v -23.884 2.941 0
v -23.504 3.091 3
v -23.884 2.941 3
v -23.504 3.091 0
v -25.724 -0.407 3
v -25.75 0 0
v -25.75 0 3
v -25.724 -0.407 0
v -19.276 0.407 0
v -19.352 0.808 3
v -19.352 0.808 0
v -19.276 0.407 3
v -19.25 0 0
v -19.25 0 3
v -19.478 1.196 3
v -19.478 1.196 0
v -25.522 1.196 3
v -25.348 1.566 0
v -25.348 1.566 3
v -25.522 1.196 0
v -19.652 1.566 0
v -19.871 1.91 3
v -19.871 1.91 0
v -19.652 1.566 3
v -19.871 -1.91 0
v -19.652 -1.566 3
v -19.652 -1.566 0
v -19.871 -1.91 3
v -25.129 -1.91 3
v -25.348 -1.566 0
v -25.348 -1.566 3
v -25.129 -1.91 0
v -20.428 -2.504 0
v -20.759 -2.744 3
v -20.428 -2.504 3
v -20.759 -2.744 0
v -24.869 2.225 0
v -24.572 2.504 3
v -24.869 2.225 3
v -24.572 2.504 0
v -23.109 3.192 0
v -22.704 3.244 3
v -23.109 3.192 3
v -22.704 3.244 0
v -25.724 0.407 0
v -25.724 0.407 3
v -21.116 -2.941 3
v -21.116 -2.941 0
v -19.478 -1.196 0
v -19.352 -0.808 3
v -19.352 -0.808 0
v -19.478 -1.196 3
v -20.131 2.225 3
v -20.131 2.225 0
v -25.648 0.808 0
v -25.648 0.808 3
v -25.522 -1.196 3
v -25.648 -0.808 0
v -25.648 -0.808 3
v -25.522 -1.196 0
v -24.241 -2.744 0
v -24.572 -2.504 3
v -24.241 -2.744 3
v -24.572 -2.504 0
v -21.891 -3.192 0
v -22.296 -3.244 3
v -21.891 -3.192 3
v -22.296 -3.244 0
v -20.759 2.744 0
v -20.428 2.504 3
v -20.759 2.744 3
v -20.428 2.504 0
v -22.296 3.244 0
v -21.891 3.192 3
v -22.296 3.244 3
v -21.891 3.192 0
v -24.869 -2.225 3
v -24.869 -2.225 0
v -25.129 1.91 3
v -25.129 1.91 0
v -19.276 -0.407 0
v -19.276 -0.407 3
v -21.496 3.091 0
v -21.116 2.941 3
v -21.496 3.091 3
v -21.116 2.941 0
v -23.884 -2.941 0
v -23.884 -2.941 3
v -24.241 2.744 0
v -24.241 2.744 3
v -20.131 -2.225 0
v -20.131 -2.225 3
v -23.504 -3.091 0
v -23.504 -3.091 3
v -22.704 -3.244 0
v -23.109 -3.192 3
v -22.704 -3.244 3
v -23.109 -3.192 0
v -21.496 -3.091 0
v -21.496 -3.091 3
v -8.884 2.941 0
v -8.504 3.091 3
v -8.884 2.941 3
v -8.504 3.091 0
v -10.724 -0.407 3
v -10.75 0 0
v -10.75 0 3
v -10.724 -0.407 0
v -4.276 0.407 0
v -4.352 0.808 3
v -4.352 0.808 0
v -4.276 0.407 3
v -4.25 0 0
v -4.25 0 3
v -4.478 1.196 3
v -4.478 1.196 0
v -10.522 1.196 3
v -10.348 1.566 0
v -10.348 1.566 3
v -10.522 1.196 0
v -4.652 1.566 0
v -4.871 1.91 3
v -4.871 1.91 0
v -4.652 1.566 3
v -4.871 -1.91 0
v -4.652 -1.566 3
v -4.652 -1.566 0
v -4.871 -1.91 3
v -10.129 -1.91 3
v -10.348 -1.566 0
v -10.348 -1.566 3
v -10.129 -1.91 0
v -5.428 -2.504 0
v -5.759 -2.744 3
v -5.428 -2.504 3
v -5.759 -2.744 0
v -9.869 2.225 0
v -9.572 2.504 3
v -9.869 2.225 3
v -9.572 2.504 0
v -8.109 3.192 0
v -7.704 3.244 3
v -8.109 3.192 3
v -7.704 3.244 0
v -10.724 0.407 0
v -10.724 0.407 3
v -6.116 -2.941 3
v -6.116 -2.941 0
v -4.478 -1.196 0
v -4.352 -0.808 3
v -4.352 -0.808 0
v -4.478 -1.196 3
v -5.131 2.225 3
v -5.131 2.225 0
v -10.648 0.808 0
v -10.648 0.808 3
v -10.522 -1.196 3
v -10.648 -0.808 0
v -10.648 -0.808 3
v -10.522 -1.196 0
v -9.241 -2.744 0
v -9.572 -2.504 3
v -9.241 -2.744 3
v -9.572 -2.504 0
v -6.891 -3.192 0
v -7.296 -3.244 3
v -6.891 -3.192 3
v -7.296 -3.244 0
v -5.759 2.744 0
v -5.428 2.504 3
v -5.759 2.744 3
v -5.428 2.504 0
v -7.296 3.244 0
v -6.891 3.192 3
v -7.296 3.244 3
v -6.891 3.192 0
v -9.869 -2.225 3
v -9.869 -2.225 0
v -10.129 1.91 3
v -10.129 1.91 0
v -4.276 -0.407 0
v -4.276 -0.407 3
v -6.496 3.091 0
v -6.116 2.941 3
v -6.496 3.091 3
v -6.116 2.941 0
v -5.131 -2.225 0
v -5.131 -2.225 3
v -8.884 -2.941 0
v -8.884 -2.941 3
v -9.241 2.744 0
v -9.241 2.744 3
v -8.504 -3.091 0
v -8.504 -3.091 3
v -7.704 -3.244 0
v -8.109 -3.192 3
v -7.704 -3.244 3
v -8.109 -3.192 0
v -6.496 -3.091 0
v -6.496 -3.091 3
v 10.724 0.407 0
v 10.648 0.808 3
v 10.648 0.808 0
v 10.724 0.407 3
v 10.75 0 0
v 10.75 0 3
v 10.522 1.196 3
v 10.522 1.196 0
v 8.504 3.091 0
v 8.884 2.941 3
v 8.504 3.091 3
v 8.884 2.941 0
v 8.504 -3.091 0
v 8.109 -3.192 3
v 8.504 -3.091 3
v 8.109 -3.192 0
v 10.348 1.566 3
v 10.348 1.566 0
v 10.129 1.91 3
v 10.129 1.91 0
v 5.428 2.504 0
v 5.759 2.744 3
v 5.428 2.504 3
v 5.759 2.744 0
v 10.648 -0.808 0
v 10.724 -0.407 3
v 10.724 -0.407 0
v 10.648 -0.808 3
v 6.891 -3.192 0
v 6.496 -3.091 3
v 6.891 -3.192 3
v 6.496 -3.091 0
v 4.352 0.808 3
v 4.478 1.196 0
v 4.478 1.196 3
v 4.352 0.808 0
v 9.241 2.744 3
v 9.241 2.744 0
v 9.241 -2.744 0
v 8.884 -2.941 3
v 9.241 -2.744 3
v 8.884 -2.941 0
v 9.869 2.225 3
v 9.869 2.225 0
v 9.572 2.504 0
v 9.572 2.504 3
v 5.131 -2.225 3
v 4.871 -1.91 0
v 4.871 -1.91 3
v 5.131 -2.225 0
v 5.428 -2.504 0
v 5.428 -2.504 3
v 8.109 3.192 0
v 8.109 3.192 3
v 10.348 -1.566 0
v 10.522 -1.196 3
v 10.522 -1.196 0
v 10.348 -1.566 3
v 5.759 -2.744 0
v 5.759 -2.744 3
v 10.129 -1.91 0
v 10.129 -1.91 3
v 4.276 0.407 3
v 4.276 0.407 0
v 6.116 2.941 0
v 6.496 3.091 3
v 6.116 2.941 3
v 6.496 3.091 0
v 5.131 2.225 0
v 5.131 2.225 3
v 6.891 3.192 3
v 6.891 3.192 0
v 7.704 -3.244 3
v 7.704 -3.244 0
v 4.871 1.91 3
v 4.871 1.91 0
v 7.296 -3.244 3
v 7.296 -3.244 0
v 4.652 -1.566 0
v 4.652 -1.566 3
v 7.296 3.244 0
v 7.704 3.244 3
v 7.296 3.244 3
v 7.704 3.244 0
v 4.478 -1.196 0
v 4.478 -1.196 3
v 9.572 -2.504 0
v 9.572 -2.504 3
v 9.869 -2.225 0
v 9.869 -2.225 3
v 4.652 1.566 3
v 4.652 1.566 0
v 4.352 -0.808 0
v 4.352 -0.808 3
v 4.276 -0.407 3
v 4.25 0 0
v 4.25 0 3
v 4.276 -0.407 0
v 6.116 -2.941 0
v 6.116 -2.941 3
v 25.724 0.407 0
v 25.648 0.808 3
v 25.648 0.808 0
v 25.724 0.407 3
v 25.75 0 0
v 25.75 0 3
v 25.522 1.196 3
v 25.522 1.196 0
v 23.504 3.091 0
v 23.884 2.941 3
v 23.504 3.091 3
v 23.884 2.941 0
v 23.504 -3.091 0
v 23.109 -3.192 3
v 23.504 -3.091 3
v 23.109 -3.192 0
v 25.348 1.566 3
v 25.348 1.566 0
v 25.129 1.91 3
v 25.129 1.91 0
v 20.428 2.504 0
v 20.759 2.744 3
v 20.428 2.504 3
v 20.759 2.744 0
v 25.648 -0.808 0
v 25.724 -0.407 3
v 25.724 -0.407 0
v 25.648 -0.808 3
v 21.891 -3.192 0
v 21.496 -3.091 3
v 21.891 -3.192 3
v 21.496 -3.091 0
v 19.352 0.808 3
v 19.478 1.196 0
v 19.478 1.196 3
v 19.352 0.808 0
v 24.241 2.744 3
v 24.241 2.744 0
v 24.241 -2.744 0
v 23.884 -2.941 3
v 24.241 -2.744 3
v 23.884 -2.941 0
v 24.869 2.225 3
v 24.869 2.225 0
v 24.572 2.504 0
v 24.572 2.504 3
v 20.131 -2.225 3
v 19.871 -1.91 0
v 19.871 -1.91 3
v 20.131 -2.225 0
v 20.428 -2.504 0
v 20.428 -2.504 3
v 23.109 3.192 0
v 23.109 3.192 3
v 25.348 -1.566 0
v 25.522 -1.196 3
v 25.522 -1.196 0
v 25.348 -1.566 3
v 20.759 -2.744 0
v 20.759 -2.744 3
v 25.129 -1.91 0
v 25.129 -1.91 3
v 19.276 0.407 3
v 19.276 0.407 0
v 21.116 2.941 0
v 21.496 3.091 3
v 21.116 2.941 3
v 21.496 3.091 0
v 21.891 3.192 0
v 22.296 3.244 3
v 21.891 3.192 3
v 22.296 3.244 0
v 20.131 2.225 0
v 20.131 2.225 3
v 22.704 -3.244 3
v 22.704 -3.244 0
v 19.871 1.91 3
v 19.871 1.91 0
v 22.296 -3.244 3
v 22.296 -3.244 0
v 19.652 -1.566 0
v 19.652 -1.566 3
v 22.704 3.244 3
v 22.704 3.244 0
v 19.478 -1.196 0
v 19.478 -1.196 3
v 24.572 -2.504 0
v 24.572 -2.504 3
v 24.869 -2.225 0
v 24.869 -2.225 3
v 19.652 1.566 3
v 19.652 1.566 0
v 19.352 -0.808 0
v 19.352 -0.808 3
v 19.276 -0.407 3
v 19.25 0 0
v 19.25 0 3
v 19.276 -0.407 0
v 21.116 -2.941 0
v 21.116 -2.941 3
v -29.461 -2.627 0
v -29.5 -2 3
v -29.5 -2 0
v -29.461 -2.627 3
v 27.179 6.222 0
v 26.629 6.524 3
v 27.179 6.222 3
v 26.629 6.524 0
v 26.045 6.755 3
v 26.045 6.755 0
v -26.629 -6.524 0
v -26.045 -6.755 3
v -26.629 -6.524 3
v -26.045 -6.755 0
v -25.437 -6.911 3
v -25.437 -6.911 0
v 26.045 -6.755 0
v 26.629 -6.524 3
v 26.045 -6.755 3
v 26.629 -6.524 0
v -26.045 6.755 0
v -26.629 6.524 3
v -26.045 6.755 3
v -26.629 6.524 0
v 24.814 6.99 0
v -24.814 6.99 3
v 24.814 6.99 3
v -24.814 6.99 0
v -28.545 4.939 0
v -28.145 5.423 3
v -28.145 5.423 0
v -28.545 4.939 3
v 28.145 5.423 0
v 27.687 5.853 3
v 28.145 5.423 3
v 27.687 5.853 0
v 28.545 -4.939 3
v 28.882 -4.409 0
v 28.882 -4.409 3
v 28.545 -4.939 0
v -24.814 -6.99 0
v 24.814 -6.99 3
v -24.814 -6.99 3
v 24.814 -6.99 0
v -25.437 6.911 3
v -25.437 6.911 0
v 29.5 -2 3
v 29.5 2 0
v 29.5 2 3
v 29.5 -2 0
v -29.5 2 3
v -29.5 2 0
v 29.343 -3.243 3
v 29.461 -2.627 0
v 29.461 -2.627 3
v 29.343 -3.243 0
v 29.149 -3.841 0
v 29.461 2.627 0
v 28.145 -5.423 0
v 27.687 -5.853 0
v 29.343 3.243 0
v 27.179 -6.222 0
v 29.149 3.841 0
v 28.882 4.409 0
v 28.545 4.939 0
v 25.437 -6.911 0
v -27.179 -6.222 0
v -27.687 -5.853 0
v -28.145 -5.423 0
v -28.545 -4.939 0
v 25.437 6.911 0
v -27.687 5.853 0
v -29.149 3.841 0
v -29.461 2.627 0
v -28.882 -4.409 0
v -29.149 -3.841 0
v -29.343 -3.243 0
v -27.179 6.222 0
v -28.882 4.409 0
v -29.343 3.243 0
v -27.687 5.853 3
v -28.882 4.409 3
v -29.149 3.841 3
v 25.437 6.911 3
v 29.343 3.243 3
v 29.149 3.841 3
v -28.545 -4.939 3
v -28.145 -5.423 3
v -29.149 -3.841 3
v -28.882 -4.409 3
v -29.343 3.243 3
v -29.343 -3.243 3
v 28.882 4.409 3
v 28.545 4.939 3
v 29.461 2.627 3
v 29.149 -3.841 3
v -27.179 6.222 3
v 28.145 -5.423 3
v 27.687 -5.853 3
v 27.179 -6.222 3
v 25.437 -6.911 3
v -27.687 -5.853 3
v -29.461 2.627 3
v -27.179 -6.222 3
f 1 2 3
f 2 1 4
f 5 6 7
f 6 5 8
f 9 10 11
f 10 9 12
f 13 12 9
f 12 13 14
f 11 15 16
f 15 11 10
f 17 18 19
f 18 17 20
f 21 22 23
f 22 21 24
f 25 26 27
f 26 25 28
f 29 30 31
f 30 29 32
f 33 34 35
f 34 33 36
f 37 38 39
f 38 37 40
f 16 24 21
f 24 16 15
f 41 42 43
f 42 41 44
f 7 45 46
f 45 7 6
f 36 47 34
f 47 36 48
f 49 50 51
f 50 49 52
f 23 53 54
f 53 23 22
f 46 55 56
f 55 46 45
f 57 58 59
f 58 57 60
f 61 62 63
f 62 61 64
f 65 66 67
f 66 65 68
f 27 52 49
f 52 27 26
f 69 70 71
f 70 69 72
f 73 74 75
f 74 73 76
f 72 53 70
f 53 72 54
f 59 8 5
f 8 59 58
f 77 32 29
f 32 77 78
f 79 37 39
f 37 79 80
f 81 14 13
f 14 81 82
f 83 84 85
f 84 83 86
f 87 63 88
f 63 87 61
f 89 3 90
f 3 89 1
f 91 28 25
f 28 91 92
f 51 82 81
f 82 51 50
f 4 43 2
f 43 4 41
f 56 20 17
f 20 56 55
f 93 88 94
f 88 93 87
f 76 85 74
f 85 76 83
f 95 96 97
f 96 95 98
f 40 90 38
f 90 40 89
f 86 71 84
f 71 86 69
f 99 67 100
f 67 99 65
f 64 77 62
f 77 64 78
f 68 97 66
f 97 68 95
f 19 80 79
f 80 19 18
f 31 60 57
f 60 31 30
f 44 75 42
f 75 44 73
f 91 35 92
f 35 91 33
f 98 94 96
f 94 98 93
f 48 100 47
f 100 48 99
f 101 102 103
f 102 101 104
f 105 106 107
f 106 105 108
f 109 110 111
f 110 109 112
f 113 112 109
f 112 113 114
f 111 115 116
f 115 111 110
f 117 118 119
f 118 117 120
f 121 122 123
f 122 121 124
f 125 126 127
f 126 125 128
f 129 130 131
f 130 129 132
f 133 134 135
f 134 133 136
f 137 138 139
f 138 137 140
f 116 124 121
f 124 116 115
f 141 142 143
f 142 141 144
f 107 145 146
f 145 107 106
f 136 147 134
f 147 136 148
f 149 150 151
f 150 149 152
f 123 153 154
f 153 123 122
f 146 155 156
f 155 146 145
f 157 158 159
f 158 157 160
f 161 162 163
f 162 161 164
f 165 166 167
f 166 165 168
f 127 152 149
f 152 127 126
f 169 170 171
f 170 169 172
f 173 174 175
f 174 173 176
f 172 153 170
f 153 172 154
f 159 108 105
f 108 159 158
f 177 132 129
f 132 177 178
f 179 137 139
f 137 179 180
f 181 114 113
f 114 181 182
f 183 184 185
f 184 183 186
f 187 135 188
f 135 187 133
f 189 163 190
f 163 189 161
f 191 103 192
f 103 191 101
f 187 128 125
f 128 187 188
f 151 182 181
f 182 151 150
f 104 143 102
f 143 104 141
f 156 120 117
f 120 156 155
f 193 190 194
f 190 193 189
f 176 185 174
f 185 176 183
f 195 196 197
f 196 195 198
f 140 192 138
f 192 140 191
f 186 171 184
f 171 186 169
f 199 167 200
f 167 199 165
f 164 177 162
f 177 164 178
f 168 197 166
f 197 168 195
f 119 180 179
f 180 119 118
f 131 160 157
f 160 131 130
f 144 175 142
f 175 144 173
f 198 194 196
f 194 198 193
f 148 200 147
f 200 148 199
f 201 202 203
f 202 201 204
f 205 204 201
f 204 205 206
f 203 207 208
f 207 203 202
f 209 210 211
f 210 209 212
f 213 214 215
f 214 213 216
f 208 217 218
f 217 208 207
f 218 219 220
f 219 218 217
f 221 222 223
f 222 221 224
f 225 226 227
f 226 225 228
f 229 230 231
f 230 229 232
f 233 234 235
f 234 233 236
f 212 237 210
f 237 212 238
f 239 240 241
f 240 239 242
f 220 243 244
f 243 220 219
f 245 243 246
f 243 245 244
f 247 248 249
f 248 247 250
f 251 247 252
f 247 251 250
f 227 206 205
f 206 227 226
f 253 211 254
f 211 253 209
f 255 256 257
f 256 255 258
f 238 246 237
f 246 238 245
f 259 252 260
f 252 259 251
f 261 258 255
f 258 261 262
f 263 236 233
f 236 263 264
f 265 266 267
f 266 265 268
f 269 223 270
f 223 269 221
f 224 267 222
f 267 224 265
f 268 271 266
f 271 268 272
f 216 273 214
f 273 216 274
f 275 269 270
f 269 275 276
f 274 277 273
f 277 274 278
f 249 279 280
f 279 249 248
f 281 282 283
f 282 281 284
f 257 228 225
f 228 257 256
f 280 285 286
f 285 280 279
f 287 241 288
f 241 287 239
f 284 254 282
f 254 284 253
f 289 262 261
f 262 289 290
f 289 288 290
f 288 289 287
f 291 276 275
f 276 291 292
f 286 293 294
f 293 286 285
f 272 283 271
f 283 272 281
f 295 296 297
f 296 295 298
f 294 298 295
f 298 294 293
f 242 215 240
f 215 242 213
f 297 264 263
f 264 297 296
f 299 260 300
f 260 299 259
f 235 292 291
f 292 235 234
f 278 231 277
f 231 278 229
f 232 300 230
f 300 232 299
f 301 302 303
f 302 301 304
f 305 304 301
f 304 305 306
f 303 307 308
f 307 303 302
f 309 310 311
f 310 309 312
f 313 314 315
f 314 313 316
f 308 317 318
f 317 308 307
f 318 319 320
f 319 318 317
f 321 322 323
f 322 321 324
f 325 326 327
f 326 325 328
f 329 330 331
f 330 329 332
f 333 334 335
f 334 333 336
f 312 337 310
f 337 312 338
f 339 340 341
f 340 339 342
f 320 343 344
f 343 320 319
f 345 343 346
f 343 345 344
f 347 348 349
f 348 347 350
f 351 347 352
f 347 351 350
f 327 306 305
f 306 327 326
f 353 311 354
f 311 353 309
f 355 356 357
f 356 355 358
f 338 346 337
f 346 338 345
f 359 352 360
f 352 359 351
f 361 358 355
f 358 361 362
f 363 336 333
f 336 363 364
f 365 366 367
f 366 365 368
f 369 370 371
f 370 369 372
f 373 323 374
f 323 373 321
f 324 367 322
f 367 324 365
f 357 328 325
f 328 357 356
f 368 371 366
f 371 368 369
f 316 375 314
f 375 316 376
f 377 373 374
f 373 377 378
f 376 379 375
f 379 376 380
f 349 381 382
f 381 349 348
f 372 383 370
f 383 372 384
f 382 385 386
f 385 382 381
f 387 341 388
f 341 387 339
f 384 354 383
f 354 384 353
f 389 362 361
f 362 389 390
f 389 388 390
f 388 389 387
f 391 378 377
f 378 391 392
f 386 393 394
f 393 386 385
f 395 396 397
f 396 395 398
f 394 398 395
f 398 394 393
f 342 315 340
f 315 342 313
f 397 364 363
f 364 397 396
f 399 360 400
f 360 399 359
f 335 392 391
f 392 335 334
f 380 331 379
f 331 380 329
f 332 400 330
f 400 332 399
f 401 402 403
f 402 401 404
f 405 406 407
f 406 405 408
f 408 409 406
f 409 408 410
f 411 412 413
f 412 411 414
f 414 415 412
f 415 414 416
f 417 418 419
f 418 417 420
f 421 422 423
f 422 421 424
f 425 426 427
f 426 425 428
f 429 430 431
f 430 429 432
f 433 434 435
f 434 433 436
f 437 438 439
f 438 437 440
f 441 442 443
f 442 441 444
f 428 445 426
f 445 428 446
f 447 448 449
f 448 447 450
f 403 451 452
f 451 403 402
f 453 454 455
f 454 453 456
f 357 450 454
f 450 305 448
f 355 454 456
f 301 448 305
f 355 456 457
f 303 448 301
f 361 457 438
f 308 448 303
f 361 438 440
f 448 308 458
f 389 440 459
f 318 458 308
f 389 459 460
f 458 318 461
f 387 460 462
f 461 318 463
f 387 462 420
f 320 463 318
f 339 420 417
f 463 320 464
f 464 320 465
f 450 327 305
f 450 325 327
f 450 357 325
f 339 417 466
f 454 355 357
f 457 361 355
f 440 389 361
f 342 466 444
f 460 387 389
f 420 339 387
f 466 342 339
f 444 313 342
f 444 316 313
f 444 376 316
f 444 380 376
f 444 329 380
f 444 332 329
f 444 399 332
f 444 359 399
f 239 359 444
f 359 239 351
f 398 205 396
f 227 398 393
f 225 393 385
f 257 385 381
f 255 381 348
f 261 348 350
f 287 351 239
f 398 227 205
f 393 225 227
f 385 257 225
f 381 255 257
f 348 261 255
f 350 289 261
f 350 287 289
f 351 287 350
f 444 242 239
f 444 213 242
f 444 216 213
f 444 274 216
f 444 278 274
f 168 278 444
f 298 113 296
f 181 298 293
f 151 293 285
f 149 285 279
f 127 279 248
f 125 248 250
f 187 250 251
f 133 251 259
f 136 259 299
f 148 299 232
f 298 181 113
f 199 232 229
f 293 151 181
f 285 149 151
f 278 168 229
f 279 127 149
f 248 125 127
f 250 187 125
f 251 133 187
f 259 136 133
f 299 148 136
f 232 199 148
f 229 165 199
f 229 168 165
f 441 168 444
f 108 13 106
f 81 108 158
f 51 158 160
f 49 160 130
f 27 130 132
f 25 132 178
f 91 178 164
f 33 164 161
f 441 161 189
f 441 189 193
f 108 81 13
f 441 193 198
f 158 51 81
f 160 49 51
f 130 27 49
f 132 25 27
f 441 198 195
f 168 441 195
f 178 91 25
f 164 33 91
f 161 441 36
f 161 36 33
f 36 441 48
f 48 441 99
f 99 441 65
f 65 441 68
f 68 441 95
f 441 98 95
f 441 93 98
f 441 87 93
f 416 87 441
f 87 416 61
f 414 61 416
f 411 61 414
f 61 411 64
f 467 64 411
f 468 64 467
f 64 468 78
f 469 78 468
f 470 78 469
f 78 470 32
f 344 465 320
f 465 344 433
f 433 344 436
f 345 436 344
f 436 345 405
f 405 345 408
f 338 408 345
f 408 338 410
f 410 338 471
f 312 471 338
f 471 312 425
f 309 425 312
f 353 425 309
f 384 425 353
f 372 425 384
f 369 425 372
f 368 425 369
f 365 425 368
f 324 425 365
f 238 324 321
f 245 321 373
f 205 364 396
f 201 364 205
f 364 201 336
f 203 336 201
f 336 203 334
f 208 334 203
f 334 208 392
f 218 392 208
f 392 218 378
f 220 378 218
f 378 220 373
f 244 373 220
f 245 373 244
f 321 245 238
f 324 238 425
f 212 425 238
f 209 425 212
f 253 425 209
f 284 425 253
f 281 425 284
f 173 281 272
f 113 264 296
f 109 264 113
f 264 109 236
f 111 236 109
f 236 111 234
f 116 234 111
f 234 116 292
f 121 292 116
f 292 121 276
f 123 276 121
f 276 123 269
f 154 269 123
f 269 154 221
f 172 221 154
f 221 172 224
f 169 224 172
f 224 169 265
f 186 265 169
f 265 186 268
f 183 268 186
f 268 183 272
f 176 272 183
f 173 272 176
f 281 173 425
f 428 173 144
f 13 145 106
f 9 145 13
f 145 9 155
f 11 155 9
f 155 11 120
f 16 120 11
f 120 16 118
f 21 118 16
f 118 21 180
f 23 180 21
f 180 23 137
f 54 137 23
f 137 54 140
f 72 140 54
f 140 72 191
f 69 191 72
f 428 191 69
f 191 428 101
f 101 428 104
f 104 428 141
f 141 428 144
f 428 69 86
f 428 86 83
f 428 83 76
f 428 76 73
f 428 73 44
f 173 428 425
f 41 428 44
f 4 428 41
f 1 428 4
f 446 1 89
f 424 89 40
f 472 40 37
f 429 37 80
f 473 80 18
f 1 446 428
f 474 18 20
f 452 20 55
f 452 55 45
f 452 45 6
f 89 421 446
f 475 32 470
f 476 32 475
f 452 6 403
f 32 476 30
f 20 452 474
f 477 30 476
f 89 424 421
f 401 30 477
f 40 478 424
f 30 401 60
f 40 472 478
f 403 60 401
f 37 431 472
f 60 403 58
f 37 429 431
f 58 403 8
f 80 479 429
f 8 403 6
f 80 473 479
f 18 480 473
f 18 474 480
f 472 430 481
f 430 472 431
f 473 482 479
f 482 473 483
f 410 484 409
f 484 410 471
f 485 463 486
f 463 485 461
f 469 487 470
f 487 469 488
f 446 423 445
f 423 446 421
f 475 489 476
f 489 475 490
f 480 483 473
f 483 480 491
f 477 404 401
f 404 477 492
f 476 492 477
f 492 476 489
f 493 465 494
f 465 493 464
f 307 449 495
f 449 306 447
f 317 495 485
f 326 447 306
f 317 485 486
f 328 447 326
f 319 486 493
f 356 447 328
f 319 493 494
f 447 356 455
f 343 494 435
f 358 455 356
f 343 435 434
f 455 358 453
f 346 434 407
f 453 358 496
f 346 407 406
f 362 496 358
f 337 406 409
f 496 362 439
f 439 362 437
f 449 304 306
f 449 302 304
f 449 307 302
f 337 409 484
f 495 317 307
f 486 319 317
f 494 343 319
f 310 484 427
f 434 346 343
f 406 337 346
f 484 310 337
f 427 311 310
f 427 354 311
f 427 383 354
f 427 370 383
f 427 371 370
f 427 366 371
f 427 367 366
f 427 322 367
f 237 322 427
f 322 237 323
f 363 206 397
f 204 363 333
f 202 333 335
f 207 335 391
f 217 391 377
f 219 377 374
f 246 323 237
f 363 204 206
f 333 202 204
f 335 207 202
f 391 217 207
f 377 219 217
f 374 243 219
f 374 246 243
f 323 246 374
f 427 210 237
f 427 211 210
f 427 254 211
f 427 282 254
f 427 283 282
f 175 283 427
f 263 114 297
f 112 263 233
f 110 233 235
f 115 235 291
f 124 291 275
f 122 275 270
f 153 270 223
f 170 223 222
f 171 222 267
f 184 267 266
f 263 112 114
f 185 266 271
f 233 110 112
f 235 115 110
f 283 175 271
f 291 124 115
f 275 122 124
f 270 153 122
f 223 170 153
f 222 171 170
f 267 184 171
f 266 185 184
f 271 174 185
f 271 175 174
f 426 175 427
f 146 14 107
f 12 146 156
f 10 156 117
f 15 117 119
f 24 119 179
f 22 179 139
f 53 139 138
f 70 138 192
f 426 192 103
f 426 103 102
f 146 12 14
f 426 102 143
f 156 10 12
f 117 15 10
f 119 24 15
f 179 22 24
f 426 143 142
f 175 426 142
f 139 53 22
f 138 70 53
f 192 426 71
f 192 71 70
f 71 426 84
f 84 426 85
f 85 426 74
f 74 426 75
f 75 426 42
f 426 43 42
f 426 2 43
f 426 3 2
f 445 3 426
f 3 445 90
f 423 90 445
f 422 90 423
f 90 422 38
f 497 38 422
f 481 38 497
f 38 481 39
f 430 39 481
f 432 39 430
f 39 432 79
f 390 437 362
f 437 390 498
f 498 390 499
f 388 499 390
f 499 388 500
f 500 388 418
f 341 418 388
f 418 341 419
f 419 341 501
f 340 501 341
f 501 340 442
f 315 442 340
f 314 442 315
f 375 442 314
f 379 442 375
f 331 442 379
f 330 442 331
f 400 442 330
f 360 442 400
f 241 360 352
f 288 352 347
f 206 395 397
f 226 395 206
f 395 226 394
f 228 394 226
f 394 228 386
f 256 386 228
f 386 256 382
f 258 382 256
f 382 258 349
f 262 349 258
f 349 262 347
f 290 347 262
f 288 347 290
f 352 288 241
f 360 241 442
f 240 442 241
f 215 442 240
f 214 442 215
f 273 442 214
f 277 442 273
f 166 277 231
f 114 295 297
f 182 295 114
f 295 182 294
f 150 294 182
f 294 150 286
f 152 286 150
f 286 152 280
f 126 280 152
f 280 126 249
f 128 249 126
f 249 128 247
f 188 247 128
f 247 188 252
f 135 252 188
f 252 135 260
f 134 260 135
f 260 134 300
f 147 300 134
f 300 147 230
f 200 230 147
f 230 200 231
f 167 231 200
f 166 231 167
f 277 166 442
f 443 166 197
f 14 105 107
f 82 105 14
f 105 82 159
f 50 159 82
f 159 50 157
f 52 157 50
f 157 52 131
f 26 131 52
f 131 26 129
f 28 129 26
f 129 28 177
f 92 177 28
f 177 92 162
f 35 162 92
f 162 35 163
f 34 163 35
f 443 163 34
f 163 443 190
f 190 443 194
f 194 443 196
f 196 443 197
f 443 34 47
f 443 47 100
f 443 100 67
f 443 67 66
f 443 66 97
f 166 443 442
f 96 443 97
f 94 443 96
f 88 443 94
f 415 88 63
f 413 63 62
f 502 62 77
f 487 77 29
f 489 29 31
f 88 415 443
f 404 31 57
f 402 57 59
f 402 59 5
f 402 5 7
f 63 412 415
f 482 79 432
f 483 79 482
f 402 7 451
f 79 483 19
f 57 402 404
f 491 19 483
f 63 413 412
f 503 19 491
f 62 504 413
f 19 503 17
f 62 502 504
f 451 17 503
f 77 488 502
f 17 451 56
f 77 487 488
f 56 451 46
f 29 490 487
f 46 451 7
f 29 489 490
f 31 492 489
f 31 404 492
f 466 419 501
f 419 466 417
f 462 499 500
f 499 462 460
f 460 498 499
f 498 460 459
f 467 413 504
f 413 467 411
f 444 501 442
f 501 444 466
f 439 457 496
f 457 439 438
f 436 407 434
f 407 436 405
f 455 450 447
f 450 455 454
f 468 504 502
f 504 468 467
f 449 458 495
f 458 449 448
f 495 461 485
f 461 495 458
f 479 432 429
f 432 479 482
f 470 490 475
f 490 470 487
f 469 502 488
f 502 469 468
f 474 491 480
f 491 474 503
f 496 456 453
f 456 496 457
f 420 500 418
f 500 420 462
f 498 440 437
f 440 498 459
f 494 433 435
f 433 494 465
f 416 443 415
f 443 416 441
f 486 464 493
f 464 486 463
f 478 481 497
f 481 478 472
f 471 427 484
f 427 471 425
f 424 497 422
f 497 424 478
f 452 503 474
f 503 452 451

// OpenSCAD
$fn = 50;


difference() {
	union() {
		translate(v = [0, 0, 0]) {
			rotate(a = [0, 0, 0]) {
				hull() {
					translate(v = [-24.5000000000, 2.0000000000, 0]) {
						rotate(a = [0, 0, 0]) {
							translate(v = [0, 0, 0]) {
								rotate(a = [0, 0, 0]) {
									cylinder(h = 3, r = 5);
								}
							}
						}
					}
					translate(v = [24.5000000000, 2.0000000000, 0]) {
						rotate(a = [0, 0, 0]) {
							translate(v = [0, 0, 0]) {
								rotate(a = [0, 0, 0]) {
									cylinder(h = 3, r = 5);
								}
							}
						}
					}
					translate(v = [-24.5000000000, -2.0000000000, 0]) {
						rotate(a = [0, 0, 0]) {
							translate(v = [0, 0, 0]) {
								rotate(a = [0, 0, 0]) {
									cylinder(h = 3, r = 5);
								}
							}
						}
					}
					translate(v = [24.5000000000, -2.0000000000, 0]) {
						rotate(a = [0, 0, 0]) {
							translate(v = [0, 0, 0]) {
								rotate(a = [0, 0, 0]) {
									cylinder(h = 3, r = 5);
								}
							}
						}
					}
				}
			}
		}
	}
	union() {
		translate(v = [-22.5000000000, 0.0000000000, 0]) {
			rotate(a = [0, 0, 0]) {
				translate(v = [0, 0, -50]) {
					rotate(a = [0, 0, 0]) {
						cylinder(h = 100, r = 3.2500000000);
					}
				}
			}
		}
		translate(v = [-7.5000000000, 0.0000000000, 0]) {
			rotate(a = [0, 0, 0]) {
				translate(v = [0, 0, -50]) {
					rotate(a = [0, 0, 0]) {
						cylinder(h = 100, r = 3.2500000000);
					}
				}
			}
		}
		translate(v = [7.5000000000, 0.0000000000, 0]) {
			rotate(a = [0, 0, 0]) {
				translate(v = [0, 0, -50]) {
					rotate(a = [0, 0, 0]) {
						cylinder(h = 100, r = 3.2500000000);
					}
				}
			}
		}
		translate(v = [22.5000000000, 0.0000000000, 0]) {
			rotate(a = [0, 0, 0]) {
				translate(v = [0, 0, -50]) {
					rotate(a = [0, 0, 0]) {
						cylinder(h = 100, r = 3.2500000000);
					}
				}
			}
		}
	}
}
